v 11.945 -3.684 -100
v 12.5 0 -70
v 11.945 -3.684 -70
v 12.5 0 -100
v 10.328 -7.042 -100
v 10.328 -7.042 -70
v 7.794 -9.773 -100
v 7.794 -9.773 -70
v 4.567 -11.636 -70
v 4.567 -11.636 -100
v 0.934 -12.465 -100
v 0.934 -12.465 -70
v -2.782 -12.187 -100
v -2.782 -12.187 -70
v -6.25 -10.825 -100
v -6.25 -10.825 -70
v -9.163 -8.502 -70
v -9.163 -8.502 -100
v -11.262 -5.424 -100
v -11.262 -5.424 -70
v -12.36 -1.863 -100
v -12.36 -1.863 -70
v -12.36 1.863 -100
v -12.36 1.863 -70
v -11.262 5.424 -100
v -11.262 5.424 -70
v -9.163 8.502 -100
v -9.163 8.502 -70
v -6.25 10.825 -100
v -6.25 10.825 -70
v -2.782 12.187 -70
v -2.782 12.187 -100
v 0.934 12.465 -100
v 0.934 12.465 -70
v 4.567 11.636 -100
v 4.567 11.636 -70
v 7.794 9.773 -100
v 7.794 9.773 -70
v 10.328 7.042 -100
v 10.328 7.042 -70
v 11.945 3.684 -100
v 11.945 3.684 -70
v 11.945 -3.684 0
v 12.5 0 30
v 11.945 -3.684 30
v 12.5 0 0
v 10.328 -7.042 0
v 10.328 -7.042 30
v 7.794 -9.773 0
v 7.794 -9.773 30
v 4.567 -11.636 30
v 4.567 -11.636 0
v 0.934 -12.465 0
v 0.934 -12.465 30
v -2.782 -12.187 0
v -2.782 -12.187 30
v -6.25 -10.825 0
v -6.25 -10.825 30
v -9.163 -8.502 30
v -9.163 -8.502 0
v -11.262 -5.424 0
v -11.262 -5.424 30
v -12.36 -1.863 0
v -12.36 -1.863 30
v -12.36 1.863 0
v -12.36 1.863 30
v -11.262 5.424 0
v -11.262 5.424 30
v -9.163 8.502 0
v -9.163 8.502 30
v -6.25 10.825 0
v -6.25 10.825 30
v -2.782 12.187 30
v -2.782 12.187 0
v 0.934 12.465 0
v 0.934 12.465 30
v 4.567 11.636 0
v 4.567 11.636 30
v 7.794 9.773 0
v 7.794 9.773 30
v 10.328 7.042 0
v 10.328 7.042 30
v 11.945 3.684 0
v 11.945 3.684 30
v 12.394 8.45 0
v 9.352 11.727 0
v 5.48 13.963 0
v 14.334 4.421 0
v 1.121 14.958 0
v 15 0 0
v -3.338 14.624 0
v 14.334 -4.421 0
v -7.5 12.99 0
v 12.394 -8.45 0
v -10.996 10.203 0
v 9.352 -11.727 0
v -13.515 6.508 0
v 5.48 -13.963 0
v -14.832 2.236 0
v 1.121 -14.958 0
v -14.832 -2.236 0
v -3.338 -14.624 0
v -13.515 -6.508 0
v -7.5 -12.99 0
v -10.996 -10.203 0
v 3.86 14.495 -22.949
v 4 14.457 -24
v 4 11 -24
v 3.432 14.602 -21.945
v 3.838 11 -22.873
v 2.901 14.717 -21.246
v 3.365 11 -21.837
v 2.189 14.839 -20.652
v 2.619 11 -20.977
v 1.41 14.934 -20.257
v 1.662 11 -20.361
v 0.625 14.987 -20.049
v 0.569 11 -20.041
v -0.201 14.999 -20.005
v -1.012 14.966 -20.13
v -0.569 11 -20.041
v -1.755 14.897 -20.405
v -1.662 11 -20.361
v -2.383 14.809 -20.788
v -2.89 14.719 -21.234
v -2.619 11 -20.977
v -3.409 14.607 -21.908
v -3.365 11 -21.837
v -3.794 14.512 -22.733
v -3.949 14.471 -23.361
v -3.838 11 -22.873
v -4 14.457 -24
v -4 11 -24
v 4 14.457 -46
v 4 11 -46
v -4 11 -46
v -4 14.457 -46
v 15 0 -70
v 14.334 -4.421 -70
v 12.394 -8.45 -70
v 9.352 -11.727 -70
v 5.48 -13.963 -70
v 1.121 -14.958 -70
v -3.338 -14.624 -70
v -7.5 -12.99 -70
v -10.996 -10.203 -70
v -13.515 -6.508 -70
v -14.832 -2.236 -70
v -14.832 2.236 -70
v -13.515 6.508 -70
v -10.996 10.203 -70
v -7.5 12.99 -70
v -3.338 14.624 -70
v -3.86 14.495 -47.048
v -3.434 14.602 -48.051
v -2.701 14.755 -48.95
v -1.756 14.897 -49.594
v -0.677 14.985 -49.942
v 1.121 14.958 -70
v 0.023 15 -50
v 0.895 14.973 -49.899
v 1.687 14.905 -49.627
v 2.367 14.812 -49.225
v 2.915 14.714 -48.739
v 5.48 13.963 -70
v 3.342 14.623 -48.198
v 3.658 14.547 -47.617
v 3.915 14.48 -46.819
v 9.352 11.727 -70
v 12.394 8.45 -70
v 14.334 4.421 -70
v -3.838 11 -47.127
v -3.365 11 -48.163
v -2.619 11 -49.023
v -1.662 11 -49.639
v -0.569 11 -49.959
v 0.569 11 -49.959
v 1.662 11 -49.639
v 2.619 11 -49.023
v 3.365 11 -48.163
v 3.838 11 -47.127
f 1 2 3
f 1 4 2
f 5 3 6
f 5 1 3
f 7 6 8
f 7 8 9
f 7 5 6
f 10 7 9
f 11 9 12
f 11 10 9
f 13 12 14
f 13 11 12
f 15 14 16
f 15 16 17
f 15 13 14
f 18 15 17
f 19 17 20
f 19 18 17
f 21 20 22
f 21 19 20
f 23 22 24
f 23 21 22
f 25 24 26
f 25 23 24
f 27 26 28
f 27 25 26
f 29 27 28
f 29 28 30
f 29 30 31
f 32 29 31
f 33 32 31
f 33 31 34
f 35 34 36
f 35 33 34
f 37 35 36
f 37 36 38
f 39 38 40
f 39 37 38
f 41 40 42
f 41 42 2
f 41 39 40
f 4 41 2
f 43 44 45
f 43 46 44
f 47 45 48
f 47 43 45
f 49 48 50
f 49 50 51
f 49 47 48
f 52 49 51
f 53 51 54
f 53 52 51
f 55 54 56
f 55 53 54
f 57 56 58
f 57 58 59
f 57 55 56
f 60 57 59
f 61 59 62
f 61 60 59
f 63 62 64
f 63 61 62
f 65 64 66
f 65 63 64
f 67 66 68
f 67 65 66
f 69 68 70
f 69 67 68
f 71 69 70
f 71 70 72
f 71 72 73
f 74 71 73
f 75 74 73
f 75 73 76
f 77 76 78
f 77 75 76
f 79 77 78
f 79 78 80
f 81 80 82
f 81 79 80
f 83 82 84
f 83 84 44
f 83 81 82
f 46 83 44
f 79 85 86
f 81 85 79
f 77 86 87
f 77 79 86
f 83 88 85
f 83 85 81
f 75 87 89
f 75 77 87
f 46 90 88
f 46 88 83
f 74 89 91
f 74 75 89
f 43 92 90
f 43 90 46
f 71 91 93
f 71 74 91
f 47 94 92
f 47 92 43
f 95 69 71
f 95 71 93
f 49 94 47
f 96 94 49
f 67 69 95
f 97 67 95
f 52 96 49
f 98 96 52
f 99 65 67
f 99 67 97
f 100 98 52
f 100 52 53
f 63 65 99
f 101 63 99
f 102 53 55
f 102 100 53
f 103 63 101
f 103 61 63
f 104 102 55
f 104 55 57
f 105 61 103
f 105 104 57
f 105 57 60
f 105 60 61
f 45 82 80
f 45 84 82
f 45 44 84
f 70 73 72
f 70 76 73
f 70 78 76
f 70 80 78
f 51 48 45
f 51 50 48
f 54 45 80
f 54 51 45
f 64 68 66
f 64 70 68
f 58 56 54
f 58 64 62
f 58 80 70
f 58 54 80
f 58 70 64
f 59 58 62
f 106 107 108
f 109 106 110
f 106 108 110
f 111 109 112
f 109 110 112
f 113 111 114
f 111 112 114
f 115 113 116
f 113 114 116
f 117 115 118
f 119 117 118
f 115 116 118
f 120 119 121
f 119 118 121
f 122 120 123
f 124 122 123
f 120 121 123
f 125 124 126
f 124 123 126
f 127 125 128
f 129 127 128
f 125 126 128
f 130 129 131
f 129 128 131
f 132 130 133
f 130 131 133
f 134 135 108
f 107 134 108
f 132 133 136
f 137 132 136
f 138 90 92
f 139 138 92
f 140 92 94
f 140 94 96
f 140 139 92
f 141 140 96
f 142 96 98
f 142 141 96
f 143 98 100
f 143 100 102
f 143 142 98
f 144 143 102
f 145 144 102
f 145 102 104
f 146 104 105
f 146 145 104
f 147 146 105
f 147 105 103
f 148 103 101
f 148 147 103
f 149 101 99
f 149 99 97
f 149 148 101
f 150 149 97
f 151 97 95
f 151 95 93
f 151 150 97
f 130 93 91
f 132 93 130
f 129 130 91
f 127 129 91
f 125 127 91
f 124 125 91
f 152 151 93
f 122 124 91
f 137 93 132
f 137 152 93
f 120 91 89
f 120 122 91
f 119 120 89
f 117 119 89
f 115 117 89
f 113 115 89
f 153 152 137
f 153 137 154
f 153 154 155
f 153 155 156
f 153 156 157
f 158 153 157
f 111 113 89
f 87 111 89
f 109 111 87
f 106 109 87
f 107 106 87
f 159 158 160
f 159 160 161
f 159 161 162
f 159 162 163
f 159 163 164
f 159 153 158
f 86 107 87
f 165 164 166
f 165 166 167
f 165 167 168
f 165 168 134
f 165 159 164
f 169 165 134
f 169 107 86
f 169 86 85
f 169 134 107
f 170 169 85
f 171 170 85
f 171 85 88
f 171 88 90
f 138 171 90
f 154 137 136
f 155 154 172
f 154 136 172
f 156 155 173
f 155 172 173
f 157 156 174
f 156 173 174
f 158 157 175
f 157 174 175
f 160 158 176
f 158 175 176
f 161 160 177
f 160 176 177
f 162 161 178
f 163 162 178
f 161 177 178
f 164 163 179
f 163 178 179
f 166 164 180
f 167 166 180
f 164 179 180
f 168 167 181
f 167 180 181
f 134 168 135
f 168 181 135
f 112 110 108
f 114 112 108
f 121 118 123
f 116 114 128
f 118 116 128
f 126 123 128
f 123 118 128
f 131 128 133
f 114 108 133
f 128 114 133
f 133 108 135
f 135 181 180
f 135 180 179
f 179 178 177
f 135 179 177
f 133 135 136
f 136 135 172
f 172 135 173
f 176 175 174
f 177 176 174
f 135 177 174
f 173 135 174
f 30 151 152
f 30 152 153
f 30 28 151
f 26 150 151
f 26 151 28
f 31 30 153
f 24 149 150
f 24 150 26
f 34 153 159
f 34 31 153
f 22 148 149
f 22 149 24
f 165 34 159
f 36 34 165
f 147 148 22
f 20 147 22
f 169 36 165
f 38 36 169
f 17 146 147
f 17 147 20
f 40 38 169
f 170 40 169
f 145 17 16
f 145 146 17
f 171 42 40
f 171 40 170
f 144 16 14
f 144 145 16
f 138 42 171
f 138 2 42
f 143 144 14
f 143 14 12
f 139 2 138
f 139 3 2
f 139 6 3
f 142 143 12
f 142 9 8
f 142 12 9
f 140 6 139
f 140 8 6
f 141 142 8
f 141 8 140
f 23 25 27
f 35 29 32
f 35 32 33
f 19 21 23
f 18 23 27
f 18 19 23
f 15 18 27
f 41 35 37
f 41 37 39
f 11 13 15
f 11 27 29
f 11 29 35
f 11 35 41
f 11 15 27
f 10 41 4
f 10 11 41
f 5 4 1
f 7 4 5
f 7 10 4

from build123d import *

# Parameters (mm, degrees)
CUT_EXTRUDE1_START = 11
CUT_EXTRUDE1_DEPTH = 92.225241501


with BuildPart() as part:
    # Sketch1 → Revolve1 (revolve)
    with BuildSketch(Plane(origin=(0, 0, 0), x_dir=(0, 0, -1), z_dir=(1, 0, 0)), mode=Mode.PRIVATE) as revolve1_sk:
        Polygon((0, 15), (70, 15), (70, 12.5), (100, 12.5), (100, 0), (-30, 0), (-30, 12.5), (0, 12.5), align=None)
    revolve(revolve1_sk.sketch.rotate(Axis((0, 0, 91.723358082), (0, 0, -1)), 90), axis=Axis((0, 0, 91.723358082), (0, 0, -1)))

    # Sketch2 → Cut-Extrude1 (cut, through all)
    with BuildSketch(Plane(origin=(0, 0, 0), x_dir=(1, 0, 0), z_dir=(0, 1, 0)).offset(CUT_EXTRUDE1_START)):
        with BuildLine():
            Line((4, 46), (4, 24))
            ThreePointArc((4, 24), (0, 20), (-4, 24))
            Line((-4, 24), (-4, 46))
            ThreePointArc((-4, 46), (0, 50), (4, 46))
        make_face()
    extrude(amount=CUT_EXTRUDE1_DEPTH, mode=Mode.SUBTRACT)


solid = part.part
